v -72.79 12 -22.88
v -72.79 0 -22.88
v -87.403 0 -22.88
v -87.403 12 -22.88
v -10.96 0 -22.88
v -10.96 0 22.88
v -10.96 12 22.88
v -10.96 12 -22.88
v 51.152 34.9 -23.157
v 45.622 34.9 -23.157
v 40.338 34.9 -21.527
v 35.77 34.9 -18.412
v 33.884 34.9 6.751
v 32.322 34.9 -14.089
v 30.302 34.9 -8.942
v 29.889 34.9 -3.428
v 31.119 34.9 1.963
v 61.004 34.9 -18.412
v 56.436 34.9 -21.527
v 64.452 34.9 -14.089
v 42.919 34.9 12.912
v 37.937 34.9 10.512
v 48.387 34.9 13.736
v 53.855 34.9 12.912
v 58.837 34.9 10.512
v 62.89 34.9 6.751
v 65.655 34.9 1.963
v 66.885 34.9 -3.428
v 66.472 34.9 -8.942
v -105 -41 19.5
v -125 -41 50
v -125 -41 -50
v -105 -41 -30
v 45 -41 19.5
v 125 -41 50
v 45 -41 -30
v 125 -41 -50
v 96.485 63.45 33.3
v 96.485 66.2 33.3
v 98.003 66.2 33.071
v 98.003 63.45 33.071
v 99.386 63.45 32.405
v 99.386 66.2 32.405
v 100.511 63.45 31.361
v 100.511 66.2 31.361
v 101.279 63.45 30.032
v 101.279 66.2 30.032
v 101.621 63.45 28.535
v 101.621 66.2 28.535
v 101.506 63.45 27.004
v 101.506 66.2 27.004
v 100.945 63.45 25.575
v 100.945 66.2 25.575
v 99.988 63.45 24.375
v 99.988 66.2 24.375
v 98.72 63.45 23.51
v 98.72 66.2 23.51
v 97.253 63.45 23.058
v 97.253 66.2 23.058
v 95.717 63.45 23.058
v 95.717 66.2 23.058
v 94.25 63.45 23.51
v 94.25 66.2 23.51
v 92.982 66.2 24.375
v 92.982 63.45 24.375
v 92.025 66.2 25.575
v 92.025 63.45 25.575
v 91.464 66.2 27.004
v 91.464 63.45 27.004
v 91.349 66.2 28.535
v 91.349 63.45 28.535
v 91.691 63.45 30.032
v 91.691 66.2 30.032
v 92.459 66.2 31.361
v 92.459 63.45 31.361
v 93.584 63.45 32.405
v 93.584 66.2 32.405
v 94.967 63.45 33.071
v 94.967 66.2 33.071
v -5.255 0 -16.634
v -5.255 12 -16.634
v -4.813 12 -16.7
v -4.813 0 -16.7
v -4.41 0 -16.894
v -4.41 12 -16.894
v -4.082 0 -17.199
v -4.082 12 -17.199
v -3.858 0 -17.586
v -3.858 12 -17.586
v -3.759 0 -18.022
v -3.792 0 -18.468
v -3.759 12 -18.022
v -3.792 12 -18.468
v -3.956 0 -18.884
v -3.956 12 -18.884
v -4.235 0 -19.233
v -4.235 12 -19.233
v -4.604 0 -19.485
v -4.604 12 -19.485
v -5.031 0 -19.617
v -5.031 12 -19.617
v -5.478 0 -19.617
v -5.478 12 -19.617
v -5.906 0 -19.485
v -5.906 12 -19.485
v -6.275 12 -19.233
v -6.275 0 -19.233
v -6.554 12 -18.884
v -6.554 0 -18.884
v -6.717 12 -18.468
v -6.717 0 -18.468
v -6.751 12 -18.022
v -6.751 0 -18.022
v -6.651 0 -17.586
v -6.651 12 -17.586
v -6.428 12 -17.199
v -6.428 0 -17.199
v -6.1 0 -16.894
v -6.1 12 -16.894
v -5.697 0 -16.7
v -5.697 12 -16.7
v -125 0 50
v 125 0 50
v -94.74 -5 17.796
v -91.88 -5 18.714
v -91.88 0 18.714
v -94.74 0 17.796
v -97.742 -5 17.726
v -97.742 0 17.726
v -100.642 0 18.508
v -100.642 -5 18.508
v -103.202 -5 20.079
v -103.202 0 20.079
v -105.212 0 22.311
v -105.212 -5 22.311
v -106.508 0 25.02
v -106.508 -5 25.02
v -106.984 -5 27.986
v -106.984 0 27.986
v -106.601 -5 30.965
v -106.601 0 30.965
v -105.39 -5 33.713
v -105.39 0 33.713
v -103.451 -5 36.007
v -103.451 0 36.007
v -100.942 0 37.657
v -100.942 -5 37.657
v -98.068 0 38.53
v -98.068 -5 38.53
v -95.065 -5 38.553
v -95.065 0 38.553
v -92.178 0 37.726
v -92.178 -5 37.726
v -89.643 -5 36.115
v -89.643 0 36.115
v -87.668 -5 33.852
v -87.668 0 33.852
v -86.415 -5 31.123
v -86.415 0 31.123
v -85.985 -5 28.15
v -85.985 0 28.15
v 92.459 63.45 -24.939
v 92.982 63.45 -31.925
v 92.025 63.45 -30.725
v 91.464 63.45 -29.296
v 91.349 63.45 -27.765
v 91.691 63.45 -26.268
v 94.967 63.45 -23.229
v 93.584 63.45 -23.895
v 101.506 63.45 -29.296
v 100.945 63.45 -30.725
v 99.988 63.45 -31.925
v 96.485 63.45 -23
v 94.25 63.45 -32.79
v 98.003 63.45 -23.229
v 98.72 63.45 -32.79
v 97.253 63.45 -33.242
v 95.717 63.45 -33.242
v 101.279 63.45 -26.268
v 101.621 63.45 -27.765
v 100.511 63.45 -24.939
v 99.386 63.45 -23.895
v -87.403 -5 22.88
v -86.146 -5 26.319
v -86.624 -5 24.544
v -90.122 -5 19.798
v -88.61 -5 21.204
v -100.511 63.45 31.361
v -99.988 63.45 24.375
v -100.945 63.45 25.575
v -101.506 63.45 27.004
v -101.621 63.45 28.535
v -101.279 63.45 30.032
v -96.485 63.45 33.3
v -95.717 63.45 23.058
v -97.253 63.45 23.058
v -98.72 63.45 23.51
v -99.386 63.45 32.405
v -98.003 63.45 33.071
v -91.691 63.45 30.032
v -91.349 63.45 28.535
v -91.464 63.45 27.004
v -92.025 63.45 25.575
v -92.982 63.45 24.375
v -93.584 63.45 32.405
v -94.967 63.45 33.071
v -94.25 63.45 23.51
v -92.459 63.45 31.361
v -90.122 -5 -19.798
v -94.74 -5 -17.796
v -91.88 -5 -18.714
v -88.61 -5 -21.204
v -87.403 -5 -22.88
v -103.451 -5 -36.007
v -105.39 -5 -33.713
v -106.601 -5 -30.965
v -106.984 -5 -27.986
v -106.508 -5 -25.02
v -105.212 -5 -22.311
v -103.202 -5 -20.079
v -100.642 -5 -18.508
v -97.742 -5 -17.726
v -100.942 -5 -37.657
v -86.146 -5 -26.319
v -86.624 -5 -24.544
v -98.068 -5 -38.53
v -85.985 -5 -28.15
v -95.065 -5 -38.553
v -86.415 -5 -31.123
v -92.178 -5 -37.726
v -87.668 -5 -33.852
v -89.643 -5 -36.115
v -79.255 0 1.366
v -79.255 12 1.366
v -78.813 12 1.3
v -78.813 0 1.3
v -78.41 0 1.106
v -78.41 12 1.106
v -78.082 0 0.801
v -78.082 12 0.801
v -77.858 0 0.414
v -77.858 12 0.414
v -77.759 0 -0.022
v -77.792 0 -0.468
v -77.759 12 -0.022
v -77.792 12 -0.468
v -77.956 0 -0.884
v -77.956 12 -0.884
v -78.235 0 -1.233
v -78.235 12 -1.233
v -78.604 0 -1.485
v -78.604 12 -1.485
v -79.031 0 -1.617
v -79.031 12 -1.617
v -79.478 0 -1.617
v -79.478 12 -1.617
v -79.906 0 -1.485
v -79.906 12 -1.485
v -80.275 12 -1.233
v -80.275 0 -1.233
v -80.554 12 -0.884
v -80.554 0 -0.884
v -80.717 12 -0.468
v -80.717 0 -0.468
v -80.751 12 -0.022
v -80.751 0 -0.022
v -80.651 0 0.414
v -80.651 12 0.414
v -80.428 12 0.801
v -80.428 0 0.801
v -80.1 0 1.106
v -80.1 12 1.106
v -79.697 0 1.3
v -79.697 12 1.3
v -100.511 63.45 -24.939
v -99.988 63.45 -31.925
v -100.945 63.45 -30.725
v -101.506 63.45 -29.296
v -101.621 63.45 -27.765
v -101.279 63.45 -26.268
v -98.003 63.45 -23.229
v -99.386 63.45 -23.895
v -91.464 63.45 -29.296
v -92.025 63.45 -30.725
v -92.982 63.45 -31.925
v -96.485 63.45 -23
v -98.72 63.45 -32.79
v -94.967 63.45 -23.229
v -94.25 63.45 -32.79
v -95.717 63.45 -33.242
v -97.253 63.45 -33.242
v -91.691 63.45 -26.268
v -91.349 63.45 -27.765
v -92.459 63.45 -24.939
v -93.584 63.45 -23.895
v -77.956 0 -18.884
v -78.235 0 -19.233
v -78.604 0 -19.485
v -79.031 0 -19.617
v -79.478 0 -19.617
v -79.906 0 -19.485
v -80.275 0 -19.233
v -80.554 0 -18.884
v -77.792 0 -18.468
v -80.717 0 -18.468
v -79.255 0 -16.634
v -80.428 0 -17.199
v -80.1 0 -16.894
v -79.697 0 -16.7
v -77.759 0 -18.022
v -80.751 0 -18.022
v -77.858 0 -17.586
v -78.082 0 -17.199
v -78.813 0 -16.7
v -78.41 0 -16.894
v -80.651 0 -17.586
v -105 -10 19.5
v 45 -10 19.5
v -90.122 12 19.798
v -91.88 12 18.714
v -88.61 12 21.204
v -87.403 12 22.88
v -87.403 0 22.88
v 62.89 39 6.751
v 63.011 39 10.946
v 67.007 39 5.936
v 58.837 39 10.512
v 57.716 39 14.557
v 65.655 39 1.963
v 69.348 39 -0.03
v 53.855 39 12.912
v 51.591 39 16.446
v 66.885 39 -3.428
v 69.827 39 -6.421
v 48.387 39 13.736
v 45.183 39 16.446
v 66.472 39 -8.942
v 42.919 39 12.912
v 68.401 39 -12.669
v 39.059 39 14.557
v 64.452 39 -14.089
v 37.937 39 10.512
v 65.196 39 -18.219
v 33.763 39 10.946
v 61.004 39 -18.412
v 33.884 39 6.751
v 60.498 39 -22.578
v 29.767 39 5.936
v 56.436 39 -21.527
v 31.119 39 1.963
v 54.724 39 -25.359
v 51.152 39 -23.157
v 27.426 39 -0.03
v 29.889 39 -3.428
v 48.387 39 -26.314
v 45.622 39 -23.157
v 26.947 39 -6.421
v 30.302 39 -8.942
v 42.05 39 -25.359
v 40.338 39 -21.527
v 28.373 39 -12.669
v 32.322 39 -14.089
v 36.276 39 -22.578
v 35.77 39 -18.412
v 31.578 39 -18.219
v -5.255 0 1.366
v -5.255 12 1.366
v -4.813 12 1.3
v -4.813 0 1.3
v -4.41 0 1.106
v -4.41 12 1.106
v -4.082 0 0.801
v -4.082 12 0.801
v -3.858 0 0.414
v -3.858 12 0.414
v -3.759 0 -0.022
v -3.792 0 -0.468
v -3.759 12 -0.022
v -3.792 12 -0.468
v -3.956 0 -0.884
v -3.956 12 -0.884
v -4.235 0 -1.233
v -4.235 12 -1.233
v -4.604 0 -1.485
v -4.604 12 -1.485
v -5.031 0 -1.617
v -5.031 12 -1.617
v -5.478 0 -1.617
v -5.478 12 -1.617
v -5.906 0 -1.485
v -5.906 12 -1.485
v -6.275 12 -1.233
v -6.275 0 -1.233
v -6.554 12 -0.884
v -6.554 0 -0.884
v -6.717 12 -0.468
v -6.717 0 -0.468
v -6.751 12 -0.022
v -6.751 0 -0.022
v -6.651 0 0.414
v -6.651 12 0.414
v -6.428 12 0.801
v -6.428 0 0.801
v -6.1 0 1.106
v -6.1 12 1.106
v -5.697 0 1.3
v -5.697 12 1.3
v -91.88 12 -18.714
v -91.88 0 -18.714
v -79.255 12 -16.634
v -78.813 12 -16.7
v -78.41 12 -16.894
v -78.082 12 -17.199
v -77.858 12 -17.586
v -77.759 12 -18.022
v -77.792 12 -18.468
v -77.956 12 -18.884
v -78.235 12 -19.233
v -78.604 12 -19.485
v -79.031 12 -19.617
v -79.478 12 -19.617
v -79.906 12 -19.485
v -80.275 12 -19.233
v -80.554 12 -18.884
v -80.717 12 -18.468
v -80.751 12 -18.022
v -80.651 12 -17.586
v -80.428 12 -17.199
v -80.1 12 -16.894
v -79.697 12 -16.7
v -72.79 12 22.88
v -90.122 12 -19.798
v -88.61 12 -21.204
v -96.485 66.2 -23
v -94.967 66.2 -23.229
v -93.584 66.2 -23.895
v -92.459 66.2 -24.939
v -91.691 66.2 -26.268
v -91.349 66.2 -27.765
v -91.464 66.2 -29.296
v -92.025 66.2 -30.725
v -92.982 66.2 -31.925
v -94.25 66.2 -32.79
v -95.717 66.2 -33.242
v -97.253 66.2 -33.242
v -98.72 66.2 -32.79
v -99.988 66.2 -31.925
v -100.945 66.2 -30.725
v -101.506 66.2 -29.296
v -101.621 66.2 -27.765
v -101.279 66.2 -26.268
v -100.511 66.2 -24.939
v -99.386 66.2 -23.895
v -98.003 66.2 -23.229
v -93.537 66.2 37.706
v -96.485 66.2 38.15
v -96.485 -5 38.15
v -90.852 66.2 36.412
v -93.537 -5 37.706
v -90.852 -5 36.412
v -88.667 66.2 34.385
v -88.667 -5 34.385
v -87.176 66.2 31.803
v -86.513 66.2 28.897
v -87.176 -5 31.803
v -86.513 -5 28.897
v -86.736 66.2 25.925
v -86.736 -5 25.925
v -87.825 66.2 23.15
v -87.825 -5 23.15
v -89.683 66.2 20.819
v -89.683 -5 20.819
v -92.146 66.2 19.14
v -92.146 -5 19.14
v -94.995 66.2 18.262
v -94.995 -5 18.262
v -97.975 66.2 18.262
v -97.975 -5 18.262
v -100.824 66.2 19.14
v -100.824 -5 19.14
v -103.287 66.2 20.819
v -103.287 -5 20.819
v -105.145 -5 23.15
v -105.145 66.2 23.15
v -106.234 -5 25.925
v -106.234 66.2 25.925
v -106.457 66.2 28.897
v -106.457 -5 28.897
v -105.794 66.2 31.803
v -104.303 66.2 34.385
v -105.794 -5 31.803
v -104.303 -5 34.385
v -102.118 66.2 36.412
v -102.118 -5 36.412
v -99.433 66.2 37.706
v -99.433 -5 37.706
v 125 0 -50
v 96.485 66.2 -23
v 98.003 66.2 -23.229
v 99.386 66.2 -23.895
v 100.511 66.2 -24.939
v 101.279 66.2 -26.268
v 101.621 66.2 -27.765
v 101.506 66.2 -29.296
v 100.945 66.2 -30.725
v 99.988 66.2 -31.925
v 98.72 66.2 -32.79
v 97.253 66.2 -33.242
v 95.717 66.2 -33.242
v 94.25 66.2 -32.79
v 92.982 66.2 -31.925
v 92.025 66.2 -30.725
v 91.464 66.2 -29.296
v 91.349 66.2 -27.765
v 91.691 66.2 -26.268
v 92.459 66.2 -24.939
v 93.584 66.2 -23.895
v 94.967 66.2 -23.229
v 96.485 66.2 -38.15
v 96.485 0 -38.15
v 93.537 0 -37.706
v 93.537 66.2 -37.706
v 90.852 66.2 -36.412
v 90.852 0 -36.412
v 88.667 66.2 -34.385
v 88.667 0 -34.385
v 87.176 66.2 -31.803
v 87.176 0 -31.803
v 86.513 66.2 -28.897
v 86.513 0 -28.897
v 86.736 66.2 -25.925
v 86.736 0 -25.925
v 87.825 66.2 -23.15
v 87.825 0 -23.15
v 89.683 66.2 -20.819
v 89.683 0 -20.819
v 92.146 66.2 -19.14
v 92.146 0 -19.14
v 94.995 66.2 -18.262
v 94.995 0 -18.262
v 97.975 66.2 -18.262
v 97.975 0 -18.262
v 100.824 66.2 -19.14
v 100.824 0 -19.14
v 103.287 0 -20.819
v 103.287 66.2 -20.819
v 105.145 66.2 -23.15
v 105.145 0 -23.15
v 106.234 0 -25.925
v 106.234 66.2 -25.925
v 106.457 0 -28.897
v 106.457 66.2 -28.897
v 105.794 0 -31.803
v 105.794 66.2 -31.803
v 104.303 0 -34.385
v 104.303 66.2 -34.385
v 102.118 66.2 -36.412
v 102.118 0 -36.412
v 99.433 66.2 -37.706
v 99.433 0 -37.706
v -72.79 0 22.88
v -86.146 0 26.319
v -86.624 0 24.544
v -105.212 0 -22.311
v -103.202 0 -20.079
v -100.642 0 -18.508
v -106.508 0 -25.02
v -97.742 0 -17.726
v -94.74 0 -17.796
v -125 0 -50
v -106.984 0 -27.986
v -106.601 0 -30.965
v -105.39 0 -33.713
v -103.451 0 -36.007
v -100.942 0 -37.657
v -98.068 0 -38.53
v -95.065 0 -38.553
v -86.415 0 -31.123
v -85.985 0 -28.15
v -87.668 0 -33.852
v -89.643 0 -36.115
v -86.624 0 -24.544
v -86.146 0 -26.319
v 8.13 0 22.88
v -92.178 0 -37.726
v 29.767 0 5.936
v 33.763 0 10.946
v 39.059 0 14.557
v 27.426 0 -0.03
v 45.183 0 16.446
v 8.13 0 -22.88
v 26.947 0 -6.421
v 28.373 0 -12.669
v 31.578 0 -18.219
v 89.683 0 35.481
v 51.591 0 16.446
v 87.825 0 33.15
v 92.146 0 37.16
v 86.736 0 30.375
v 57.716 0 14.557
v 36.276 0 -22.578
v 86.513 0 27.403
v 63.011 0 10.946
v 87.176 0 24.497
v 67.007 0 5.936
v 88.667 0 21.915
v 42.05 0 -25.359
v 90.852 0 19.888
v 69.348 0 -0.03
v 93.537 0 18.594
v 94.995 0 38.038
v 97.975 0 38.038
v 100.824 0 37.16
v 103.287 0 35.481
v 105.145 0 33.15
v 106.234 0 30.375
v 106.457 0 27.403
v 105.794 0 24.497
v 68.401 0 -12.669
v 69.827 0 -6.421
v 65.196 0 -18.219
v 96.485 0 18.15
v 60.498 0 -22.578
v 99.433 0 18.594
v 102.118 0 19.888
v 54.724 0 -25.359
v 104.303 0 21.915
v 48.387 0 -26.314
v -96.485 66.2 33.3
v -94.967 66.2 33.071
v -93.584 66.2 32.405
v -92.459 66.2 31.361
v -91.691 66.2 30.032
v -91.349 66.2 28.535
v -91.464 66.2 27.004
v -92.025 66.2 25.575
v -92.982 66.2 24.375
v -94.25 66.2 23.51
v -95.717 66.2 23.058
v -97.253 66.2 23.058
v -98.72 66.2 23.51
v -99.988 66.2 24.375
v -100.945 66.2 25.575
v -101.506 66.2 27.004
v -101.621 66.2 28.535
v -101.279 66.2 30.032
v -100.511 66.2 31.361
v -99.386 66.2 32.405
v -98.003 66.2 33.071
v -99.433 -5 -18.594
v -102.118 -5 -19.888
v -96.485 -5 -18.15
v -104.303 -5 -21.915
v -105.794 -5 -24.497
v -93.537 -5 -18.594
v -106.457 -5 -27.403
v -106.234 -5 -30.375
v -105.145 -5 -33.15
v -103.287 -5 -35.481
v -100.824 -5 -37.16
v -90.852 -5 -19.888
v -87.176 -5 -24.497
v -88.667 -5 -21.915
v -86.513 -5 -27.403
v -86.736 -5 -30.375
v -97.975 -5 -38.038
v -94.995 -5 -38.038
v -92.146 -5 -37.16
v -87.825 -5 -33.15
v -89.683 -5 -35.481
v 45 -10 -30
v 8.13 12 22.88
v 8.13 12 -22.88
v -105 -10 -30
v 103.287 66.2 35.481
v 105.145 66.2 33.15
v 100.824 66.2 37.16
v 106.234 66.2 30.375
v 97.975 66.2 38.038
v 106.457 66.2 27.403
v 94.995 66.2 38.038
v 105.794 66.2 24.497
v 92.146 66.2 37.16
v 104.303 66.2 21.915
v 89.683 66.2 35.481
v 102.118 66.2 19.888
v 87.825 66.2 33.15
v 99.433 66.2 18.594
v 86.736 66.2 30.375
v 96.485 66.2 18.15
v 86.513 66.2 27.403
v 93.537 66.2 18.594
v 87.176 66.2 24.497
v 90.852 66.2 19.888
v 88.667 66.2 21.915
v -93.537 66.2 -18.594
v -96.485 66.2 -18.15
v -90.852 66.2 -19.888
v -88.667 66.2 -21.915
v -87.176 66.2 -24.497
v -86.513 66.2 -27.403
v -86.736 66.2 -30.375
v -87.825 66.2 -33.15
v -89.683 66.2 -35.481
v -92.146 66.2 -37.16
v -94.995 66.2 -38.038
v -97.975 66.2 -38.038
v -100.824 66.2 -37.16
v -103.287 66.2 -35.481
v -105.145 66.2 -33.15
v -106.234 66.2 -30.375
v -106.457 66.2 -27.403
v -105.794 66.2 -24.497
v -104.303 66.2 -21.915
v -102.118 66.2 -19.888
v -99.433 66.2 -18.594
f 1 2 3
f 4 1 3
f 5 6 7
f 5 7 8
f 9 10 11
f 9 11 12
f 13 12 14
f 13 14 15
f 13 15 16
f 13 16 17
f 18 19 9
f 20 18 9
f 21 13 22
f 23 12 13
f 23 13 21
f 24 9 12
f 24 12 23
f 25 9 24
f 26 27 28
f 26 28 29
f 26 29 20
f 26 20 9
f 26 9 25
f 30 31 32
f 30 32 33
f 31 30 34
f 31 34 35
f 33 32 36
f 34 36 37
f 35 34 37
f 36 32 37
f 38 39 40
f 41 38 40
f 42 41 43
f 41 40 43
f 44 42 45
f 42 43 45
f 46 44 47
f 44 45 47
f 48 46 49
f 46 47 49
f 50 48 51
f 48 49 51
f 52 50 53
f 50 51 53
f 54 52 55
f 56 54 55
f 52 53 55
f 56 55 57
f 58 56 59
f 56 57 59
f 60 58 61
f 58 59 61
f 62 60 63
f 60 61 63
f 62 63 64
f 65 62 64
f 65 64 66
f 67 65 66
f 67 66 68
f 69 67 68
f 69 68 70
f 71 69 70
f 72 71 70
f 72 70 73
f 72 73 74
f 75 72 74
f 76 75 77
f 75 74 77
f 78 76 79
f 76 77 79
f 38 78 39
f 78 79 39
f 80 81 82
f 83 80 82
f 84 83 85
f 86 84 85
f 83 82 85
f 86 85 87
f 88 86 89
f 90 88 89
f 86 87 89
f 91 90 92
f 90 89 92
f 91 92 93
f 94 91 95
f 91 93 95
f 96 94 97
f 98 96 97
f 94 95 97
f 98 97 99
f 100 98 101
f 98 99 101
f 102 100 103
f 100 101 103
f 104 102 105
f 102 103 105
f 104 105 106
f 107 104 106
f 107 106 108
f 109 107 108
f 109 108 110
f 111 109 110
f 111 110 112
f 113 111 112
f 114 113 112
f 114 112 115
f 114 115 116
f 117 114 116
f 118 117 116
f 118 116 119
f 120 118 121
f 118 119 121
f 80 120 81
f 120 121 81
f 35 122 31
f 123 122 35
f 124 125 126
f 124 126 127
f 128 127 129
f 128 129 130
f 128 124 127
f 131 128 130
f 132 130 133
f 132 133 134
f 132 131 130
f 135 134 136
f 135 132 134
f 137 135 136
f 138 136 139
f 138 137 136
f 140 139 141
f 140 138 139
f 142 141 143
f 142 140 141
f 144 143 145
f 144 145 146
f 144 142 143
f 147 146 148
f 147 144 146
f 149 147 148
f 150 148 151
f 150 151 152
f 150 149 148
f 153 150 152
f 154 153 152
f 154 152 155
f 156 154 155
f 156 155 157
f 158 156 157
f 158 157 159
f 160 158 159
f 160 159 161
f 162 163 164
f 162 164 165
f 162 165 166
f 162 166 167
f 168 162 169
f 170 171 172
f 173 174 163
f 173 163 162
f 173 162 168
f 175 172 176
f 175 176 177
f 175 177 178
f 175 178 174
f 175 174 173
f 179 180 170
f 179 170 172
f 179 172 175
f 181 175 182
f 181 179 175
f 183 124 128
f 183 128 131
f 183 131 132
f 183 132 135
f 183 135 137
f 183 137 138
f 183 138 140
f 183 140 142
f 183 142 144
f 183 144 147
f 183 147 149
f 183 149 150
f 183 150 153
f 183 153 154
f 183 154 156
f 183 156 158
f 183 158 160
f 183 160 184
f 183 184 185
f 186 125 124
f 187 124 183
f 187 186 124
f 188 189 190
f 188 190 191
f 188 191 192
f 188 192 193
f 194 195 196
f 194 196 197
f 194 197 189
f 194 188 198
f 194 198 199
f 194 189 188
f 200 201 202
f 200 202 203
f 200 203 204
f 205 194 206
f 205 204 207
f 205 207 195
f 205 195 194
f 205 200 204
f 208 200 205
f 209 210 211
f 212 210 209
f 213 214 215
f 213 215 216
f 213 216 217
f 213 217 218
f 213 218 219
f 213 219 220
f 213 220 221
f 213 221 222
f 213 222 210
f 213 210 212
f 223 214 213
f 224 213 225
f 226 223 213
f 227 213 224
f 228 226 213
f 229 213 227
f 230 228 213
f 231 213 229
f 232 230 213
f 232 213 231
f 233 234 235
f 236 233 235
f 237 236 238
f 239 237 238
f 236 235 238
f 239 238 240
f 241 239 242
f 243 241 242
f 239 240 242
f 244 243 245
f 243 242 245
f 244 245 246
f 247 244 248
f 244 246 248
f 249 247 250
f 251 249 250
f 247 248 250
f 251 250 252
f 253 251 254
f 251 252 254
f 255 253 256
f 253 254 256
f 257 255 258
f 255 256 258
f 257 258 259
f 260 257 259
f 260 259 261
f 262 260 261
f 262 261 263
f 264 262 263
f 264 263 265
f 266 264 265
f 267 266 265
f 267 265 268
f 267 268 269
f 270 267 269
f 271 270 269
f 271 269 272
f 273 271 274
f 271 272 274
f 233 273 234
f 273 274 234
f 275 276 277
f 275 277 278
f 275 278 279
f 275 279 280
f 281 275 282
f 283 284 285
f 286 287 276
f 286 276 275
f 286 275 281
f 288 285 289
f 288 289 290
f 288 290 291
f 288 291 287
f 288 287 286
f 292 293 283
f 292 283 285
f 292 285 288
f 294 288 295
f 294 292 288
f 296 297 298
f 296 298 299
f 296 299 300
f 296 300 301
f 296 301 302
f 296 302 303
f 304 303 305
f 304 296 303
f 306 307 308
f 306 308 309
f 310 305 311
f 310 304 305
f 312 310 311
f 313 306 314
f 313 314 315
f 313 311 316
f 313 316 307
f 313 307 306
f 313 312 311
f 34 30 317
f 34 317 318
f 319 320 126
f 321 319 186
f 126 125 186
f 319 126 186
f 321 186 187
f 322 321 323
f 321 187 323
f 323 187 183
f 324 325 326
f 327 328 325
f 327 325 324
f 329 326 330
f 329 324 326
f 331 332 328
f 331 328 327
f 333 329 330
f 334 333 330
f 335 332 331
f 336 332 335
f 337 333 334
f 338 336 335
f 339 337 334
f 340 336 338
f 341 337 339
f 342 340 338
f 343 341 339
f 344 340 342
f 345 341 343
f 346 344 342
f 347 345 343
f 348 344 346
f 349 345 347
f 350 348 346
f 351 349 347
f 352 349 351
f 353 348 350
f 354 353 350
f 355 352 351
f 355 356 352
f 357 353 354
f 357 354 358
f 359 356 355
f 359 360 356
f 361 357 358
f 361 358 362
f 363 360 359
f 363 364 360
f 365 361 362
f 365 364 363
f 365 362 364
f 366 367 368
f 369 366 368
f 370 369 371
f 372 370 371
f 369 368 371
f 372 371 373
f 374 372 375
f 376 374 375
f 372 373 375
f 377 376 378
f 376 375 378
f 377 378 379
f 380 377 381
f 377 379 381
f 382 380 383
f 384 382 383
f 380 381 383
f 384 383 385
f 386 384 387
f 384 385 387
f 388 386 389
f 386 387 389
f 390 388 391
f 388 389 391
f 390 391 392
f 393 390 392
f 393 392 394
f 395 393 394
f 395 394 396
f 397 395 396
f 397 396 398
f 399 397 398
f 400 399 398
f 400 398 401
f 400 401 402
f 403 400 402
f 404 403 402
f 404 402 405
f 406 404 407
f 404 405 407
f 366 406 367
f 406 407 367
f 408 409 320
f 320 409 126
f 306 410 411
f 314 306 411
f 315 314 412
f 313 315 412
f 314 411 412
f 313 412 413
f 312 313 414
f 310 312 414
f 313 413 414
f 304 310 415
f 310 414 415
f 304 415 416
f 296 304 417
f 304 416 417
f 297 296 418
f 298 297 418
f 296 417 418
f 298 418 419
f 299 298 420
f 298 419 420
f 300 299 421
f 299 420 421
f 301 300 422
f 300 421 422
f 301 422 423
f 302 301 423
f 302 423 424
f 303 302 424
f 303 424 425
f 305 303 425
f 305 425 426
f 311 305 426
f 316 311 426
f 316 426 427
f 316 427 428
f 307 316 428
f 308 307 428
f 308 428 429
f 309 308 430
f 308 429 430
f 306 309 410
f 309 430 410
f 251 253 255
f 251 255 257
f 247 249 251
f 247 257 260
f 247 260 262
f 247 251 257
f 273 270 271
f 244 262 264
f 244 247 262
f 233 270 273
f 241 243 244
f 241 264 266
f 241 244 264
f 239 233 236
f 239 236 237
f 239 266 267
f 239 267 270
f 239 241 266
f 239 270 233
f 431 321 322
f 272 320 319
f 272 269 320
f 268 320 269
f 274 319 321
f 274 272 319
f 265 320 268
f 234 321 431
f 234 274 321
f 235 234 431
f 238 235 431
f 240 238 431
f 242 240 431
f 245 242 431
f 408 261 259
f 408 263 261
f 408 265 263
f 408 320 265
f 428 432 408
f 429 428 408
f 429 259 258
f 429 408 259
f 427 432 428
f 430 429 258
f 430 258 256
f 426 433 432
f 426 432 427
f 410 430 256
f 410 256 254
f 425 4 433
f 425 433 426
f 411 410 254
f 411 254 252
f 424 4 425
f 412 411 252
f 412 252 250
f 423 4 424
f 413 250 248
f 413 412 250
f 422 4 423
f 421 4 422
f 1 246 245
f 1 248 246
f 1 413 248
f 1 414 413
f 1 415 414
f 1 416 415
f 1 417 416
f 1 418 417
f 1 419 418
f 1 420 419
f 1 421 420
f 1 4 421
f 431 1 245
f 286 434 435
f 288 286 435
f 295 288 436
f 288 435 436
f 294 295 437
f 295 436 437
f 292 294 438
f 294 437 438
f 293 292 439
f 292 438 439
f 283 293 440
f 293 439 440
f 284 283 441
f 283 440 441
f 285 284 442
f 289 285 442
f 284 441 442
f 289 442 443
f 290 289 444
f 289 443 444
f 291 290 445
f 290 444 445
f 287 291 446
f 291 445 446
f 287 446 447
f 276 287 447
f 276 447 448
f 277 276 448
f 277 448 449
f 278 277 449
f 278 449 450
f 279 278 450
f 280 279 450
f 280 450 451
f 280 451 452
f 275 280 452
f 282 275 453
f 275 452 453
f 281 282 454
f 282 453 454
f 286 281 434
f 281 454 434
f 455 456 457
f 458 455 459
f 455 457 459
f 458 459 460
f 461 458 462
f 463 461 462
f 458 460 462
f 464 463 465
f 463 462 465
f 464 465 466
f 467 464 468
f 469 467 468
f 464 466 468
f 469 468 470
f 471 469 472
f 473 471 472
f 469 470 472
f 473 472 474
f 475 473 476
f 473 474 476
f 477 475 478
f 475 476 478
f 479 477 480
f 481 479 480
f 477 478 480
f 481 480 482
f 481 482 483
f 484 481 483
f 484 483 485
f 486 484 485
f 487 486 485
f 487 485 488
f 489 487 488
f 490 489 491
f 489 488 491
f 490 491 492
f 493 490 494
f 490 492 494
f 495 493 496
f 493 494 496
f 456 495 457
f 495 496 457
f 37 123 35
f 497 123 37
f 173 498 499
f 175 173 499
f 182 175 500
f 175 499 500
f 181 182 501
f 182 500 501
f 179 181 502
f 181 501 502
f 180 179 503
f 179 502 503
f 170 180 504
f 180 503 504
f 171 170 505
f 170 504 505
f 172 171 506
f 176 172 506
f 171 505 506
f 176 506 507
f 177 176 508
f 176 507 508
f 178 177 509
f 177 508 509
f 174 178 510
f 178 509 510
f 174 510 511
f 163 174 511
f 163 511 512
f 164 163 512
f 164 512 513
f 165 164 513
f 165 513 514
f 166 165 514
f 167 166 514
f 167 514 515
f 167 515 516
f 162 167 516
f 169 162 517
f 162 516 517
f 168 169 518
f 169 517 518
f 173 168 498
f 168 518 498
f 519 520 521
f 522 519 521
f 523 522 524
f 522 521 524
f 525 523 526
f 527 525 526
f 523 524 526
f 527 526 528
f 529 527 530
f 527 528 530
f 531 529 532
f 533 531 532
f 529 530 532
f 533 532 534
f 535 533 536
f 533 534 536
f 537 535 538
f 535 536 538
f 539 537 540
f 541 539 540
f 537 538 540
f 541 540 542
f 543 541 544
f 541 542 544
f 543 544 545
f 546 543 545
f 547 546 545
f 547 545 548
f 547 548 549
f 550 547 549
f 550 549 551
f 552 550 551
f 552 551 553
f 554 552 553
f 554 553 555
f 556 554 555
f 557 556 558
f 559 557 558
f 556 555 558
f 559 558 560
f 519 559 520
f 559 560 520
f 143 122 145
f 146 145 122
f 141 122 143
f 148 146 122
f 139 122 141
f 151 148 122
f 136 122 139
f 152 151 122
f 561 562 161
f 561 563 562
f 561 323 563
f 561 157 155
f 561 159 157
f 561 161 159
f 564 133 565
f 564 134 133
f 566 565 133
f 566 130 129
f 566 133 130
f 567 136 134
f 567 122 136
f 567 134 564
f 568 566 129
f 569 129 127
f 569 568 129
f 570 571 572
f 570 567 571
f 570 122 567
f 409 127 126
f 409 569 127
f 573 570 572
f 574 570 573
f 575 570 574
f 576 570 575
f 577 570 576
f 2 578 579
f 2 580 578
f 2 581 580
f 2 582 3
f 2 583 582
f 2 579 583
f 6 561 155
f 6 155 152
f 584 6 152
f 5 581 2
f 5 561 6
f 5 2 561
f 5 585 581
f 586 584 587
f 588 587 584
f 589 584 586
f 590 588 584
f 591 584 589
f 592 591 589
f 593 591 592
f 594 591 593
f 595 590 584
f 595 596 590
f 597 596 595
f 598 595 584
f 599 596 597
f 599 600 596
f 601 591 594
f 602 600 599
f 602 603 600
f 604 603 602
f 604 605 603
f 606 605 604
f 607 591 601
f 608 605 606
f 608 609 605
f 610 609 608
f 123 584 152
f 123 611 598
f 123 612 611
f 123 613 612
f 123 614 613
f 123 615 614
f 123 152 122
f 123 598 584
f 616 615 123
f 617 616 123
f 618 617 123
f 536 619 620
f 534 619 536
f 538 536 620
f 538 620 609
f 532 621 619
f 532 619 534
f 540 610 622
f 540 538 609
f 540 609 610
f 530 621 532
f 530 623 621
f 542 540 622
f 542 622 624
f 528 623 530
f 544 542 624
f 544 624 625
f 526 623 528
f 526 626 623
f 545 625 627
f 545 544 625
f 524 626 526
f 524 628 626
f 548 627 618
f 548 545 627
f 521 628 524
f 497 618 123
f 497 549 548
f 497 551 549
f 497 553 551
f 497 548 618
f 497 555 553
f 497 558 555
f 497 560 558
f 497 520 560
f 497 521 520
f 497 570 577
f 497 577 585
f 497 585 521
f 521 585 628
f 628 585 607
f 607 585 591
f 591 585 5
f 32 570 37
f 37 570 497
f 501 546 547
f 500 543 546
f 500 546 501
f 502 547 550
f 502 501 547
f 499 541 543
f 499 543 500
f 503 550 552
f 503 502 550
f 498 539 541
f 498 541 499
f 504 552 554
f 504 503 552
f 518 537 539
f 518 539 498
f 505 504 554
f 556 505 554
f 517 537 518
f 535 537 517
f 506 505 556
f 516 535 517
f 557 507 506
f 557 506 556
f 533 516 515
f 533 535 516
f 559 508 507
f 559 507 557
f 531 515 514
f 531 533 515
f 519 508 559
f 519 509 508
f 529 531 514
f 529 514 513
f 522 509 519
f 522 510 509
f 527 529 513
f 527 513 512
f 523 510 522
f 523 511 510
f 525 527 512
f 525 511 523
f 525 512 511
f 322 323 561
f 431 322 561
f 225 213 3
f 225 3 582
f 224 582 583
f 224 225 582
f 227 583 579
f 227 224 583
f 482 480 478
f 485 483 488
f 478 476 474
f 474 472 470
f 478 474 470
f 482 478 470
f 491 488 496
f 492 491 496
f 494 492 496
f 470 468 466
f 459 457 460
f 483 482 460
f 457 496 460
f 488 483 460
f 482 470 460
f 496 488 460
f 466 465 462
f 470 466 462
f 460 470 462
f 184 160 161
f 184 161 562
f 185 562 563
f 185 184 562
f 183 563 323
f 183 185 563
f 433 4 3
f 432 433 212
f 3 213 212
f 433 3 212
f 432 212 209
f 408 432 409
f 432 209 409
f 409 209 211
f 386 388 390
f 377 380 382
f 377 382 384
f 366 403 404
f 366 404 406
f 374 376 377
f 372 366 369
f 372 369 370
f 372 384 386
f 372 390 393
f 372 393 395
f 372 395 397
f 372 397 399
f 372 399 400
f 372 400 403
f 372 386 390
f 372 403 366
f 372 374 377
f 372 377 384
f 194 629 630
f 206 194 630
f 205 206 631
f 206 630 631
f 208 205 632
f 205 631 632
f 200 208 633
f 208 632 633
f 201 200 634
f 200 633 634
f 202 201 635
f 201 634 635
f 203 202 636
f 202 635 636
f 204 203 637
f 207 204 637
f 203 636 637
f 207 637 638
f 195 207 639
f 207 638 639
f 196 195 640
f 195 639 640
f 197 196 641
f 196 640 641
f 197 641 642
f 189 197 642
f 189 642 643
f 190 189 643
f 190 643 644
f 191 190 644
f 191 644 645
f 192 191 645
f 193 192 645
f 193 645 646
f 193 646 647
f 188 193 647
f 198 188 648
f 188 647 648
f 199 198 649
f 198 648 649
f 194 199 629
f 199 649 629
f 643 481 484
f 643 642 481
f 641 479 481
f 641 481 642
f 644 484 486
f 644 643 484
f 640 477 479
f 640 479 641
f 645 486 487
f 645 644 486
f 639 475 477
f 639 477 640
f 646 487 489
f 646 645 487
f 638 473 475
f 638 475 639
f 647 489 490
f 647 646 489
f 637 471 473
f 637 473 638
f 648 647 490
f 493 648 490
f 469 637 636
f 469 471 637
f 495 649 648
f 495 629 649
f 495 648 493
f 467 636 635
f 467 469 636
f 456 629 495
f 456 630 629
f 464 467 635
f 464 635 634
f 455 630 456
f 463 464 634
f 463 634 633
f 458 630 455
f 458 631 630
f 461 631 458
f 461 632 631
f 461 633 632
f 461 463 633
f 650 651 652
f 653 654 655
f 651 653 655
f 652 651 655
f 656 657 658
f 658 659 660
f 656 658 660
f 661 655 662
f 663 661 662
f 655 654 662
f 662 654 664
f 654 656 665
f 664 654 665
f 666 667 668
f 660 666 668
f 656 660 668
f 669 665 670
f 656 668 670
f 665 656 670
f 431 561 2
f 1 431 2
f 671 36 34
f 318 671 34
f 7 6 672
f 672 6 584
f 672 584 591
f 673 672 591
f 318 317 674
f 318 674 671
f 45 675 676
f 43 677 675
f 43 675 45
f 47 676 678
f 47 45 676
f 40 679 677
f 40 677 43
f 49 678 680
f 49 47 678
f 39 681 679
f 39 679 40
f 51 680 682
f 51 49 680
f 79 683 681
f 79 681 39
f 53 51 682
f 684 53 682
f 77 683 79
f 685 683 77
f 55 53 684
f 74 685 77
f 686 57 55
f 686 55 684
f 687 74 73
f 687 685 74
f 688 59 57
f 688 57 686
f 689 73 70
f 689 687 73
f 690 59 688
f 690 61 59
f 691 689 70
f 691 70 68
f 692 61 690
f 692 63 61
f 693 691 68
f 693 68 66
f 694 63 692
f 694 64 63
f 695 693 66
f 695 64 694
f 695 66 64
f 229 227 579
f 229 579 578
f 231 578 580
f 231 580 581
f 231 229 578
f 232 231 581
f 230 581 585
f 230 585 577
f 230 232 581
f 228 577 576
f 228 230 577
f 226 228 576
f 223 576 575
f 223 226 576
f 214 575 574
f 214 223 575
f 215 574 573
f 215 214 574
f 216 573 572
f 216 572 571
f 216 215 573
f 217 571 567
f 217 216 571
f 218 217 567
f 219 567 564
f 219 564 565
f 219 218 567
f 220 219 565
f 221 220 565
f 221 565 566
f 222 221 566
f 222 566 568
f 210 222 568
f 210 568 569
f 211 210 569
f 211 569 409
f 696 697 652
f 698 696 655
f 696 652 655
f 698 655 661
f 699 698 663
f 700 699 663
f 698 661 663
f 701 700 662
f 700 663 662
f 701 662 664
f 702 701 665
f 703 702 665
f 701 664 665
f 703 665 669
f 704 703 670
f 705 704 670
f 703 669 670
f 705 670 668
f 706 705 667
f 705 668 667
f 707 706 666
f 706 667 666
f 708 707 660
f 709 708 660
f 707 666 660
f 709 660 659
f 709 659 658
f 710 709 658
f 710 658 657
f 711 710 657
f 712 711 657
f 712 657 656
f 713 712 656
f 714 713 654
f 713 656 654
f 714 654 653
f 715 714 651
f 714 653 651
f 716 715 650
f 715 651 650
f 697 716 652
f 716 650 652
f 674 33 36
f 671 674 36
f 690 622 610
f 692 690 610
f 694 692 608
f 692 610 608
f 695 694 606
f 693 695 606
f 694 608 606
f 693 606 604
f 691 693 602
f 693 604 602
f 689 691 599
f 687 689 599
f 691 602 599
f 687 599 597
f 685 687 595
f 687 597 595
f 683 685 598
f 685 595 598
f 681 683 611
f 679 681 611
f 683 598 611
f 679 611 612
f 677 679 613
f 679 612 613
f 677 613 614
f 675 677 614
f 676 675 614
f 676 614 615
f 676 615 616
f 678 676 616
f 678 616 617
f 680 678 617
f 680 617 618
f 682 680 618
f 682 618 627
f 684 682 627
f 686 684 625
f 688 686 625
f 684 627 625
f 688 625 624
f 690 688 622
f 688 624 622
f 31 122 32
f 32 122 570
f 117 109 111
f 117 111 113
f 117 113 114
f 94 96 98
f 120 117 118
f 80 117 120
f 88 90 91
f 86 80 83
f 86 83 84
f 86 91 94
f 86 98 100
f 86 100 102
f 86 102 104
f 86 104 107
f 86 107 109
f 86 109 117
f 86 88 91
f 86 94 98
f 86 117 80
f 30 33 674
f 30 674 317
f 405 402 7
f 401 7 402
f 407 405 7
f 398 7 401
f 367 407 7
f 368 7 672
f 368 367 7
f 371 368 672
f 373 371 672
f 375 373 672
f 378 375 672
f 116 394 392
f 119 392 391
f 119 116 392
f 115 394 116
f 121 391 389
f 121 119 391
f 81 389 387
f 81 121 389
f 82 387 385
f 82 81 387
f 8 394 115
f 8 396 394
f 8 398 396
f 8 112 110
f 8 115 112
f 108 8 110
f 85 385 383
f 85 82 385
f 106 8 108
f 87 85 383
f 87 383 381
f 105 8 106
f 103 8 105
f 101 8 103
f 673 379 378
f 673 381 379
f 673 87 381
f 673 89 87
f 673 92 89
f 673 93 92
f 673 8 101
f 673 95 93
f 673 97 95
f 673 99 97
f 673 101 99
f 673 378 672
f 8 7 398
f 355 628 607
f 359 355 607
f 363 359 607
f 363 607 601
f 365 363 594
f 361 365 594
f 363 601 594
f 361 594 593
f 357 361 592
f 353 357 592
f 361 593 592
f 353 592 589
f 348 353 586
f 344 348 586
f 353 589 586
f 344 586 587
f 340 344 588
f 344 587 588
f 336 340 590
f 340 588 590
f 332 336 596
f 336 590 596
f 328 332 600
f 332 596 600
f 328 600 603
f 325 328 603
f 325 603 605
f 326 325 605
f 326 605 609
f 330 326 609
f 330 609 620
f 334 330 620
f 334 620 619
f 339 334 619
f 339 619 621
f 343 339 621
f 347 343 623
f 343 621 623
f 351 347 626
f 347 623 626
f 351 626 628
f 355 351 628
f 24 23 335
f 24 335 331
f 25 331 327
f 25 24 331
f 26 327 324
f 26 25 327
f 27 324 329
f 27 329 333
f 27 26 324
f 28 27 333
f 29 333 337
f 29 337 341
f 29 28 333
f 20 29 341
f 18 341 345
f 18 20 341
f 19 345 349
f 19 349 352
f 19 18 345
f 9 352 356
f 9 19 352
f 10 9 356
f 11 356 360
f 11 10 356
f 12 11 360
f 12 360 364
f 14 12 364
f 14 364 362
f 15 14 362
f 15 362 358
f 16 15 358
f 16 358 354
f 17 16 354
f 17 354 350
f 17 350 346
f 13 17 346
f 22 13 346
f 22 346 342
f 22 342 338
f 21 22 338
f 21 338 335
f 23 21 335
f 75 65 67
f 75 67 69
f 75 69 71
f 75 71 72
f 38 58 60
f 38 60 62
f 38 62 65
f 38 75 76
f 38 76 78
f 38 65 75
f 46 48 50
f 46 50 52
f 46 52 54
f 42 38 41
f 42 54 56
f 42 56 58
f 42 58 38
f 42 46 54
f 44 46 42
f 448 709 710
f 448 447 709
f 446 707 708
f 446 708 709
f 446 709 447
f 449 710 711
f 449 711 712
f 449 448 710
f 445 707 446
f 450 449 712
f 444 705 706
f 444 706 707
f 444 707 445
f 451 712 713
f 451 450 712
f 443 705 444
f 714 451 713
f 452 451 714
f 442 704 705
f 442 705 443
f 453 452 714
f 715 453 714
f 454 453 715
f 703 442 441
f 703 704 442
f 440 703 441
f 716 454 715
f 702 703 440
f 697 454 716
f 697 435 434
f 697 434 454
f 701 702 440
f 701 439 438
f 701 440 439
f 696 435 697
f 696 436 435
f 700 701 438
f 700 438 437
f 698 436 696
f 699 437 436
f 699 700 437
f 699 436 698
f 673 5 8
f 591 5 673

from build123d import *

# Parameters (mm, degrees)
SKETCH1_W                = 250
SKETCH1_H                = 100
BOSS_EXTRUDE1_DEPTH      = 41
SKETCH1_4_W              = 19.09
SKETCH1_4_H              = 45.76
BOSS_EXTRUDE2_DEPTH      = 12
SKETCH1_5_R              = 21.5
SKETCH1_5_R_2            = 18.55
BOSS_EXTRUDE3_DEPTH      = 39
SKETCH1_6_R              = 18.55
BOSS_EXTRUDE4_DEPTH      = 34.9
CUT_EXTRUDE1_START       = -5
SKETCH1_9_R              = 10
SKETCH1_9_R_2            = 5.15
CUT_EXTRUDE1_DEPTH       = 5
SKETCH1_10_R             = 10
SKETCH1_10_R_2           = 5.15
BOSS_EXTRUDE7_DEPTH      = 66.2
BOSS_EXTRUDE8_DEPTH      = 66.2
BOSS_EXTRUDE8_DEPTH_BACK = 5
SKETCH1_11_R             = 10
SKETCH1_11_R_2           = 5.15
CUT_EXTRUDE2_START       = 66.2
SKETCH1_12_R             = 5.15
CUT_EXTRUDE2_DEPTH       = 2.75
SKETCH3_R                = 1.5
CUT_EXTRUDE3_DEPTH       = 12
SKETCH4_W                = 150
SKETCH4_H                = 49.5
CUT_EXTRUDE4_DEPTH       = 31


with BuildPart() as part:
    # Sketch1 → Boss-Extrude1 (new body)
    with BuildSketch(Plane(origin=(0, 0, 0), x_dir=(1, 0, 0), z_dir=(0, 1, 0))):
        Rectangle(SKETCH1_W, SKETCH1_H)
    extrude(amount=-BOSS_EXTRUDE1_DEPTH)

    # Sketch1<4> → Boss-Extrude2 (add)
    with BuildSketch(Plane(origin=(0, 0, 0), x_dir=(1, 0, 0), z_dir=(0, 1, 0))):
        with BuildLine():
            Line((-72.79, 22.88), (-87.40331, 22.88))
            ThreePointArc((-87.40331, 22.88), (-89.331615, 20.463708), (-91.88, 18.713688))
            Line((-91.88, 18.713688), (-91.88, -18.713688))
            ThreePointArc((-91.88, -18.713688), (-89.331615, -20.463708), (-87.40331, -22.88))
            Line((-87.40331, -22.88), (-72.79, -22.88))
            Line((-72.79, -22.88), (-72.79, 22.88))
        make_face()
        with Locations((-1.415, 0)):
            Rectangle(SKETCH1_4_W, SKETCH1_4_H)
    extrude(amount=BOSS_EXTRUDE2_DEPTH)

    # Sketch1<5> → Boss-Extrude3 (add)
    with BuildSketch(Plane(origin=(0, 0, 0), x_dir=(1, 0, 0), z_dir=(0, 1, 0))):
        with Locations(Location((48.387034, 4.81425, 0), (0, 0, 90))):
            Circle(SKETCH1_5_R)
        with Locations(Location((48.387034, 4.81425, 0), (0, 0, 270))):
            Circle(SKETCH1_5_R_2, mode=Mode.SUBTRACT)
    extrude(amount=BOSS_EXTRUDE3_DEPTH)

    # Sketch1<6> → Boss-Extrude4 (add)
    with BuildSketch(Plane(origin=(0, 0, 0), x_dir=(1, 0, 0), z_dir=(0, 1, 0))):
        with Locations(Location((48.387034, 4.81425, 0), (0, 0, 270))):
            Circle(SKETCH1_6_R)
    extrude(amount=BOSS_EXTRUDE4_DEPTH)

    # Sketch1<9> → Cut-Extrude1 (cut)
    # profile 1 of 12: a face of its own
    with BuildSketch(Plane(origin=(0, 0, 0), x_dir=(1, 0, 0), z_dir=(0, 1, 0)).offset(CUT_EXTRUDE1_START)):
        with BuildLine():
            ThreePointArc((-87.40331, -22.88), (-89.331615, -20.463708), (-91.88, -18.713688))
            Line((-91.88, -18.713688), (-91.88, -19.273403))
            ThreePointArc((-91.88, -19.273403), (-89.689537, -20.813674), (-87.986347, -22.88))
            Line((-87.986347, -22.88), (-87.40331, -22.88))
        make_face()
    # profile 2 of 12: a face of its own
    with BuildSketch(Plane(origin=(0, 0, 0), x_dir=(1, 0, 0), z_dir=(0, 1, 0)).offset(CUT_EXTRUDE1_START)):
        with BuildLine():
            Line((-91.88, -19.273403), (-91.88, -18.713688))
            ThreePointArc((-91.88, -18.713688), (-105.390125, -33.71316), (-85.985, -28.15))
            ThreePointArc((-85.985, -28.15), (-86.345775, -25.421241), (-87.40331, -22.88))
            Line((-87.40331, -22.88), (-87.986347, -22.88))
            ThreePointArc((-87.986347, -22.88), (-86.867658, -25.410158), (-86.485, -28.15))
            ThreePointArc((-86.485, -28.15), (-105.030467, -33.343746), (-91.88, -19.273403))
        make_face()
    # profile 3 of 12: a face of its own
    with BuildSketch(Plane(origin=(0, 0, 0), x_dir=(1, 0, 0), z_dir=(0, 1, 0)).offset(CUT_EXTRUDE1_START)):
        with Locations((-96.485, -28.15)):
            Circle(SKETCH1_9_R)
        with Locations((-96.485, -28.15)):
            Circle(SKETCH1_9_R_2, mode=Mode.SUBTRACT)
    # profile 4 of 12: a face of its own
    with BuildSketch(Plane(origin=(0, 0, 0), x_dir=(1, 0, 0), z_dir=(0, 1, 0)).offset(CUT_EXTRUDE1_START)):
        with Locations((-96.485, -28.15)):
            Circle(SKETCH1_9_R_2)
    # profile 5 of 12: a face of its own
    with BuildSketch(Plane(origin=(0, 0, 0), x_dir=(1, 0, 0), z_dir=(0, 1, 0)).offset(CUT_EXTRUDE1_START)):
        with BuildLine():
            ThreePointArc((-86.485, 28.15), (-86.867658, 25.410158), (-87.986347, 22.88))
            Line((-87.986347, 22.88), (-87.40331, 22.88))
            ThreePointArc((-87.40331, 22.88), (-86.345775, 25.421241), (-85.985, 28.15))
            ThreePointArc((-85.985, 28.15), (-105.390125, 33.71316), (-91.88, 18.713688))
            Line((-91.88, 18.713688), (-91.88, 19.273403))
            ThreePointArc((-91.88, 19.273403), (-105.030467, 33.343746), (-86.485, 28.15))
        make_face()
    # profile 6 of 12: a face of its own
    with BuildSketch(Plane(origin=(0, 0, 0), x_dir=(1, 0, 0), z_dir=(0, 1, 0)).offset(CUT_EXTRUDE1_START)):
        with BuildLine():
            Line((-87.40331, 22.88), (-87.986347, 22.88))
            ThreePointArc((-87.986347, 22.88), (-89.689537, 20.813674), (-91.88, 19.273403))
            Line((-91.88, 19.273403), (-91.88, 18.713688))
            ThreePointArc((-91.88, 18.713688), (-89.331615, 20.463708), (-87.40331, 22.88))
        make_face()
    # profile 7 of 12: a face of its own
    with BuildSketch(Plane(origin=(0, 0, 0), x_dir=(1, 0, 0), z_dir=(0, 1, 0)).offset(CUT_EXTRUDE1_START)):
        with Locations((-96.485, 28.15)):
            Circle(SKETCH1_9_R)
        with Locations((-96.485, 28.15)):
            Circle(SKETCH1_9_R_2, mode=Mode.SUBTRACT)
    # profile 8 of 12: a face of its own
    with BuildSketch(Plane(origin=(0, 0, 0), x_dir=(1, 0, 0), z_dir=(0, 1, 0)).offset(CUT_EXTRUDE1_START)):
        with Locations((-96.485, 28.15)):
            Circle(SKETCH1_9_R_2)
    # profile 9 of 12: a face of its own
    with BuildSketch(Plane(origin=(0, 0, 0), x_dir=(1, 0, 0), z_dir=(0, 1, 0)).offset(CUT_EXTRUDE1_START)):
        with BuildLine():
            ThreePointArc((-87.40331, -22.88), (-89.331615, -20.463708), (-91.88, -18.713688))
            Line((-91.88, -18.713688), (-91.88, -19.273403))
            ThreePointArc((-91.88, -19.273403), (-89.689537, -20.813674), (-87.986347, -22.88))
            Line((-87.986347, -22.88), (-87.40331, -22.88))
        make_face()
    # profile 10 of 12: a face of its own
    with BuildSketch(Plane(origin=(0, 0, 0), x_dir=(1, 0, 0), z_dir=(0, 1, 0)).offset(CUT_EXTRUDE1_START)):
        with BuildLine():
            Line((-91.88, -19.273403), (-91.88, -18.713688))
            ThreePointArc((-91.88, -18.713688), (-105.390125, -33.71316), (-85.985, -28.15))
            ThreePointArc((-85.985, -28.15), (-86.345775, -25.421241), (-87.40331, -22.88))
            Line((-87.40331, -22.88), (-87.986347, -22.88))
            ThreePointArc((-87.986347, -22.88), (-86.867658, -25.410158), (-86.485, -28.15))
            ThreePointArc((-86.485, -28.15), (-105.030467, -33.343746), (-91.88, -19.273403))
        make_face()
    # profile 11 of 12: a face of its own
    with BuildSketch(Plane(origin=(0, 0, 0), x_dir=(1, 0, 0), z_dir=(0, 1, 0)).offset(CUT_EXTRUDE1_START)):
        with BuildLine():
            ThreePointArc((-86.485, 28.15), (-86.867658, 25.410158), (-87.986347, 22.88))
            Line((-87.986347, 22.88), (-87.40331, 22.88))
            ThreePointArc((-87.40331, 22.88), (-86.345775, 25.421241), (-85.985, 28.15))
            ThreePointArc((-85.985, 28.15), (-105.390125, 33.71316), (-91.88, 18.713688))
            Line((-91.88, 18.713688), (-91.88, 19.273403))
            ThreePointArc((-91.88, 19.273403), (-105.030467, 33.343746), (-86.485, 28.15))
        make_face()
    # profile 12 of 12: a face of its own
    with BuildSketch(Plane(origin=(0, 0, 0), x_dir=(1, 0, 0), z_dir=(0, 1, 0)).offset(CUT_EXTRUDE1_START)):
        with BuildLine():
            Line((-87.40331, 22.88), (-87.986347, 22.88))
            ThreePointArc((-87.986347, 22.88), (-89.689537, 20.813674), (-91.88, 19.273403))
            Line((-91.88, 19.273403), (-91.88, 18.713688))
            ThreePointArc((-91.88, 18.713688), (-89.331615, 20.463708), (-87.40331, 22.88))
        make_face()
    extrude(amount=CUT_EXTRUDE1_DEPTH, mode=Mode.SUBTRACT)

    # Sketch1<10> → Boss-Extrude7 (add)
    # profile 1 of 4: a face of its own
    with BuildSketch(Plane(origin=(0, 0, 0), x_dir=(1, 0, 0), z_dir=(0, 1, 0))):
        with Locations(Location((96.485, -28.15, 0), (0, 0, 90))):
            Circle(SKETCH1_10_R)
        with Locations((96.485, -28.15)):
            Circle(SKETCH1_10_R_2, mode=Mode.SUBTRACT)
    # profile 2 of 4: a face of its own
    with BuildSketch(Plane(origin=(0, 0, 0), x_dir=(1, 0, 0), z_dir=(0, 1, 0))):
        with Locations((96.485, -28.15)):
            Circle(SKETCH1_10_R_2)
    # profile 3 of 4: a face of its own
    with BuildSketch(Plane(origin=(0, 0, 0), x_dir=(1, 0, 0), z_dir=(0, 1, 0))):
        with Locations(Location((96.485, 28.15, 0), (0, 0, 90))):
            Circle(SKETCH1_10_R)
        with Locations((96.485, 28.15)):
            Circle(SKETCH1_10_R_2, mode=Mode.SUBTRACT)
    # profile 4 of 4: a face of its own
    with BuildSketch(Plane(origin=(0, 0, 0), x_dir=(1, 0, 0), z_dir=(0, 1, 0))):
        with Locations((96.485, 28.15)):
            Circle(SKETCH1_10_R_2)
    extrude(amount=BOSS_EXTRUDE7_DEPTH)


with BuildPart() as body_2:
    # Sketch1<11> → Boss-Extrude8 (new, two sides: drawn at the far end of the back side and taken through both)
    # profile 1 of 4: a face of its own
    with BuildSketch(Plane(origin=(0, 0, 0), x_dir=(1, 0, 0), z_dir=(0, 1, 0)).offset(-BOSS_EXTRUDE8_DEPTH_BACK)):
        with Locations(Location((-96.485, -28.15, 0), (0, 0, 270))):
            Circle(SKETCH1_11_R)
        with Locations((-96.485, -28.15)):
            Circle(SKETCH1_11_R_2, mode=Mode.SUBTRACT)
    # profile 2 of 4: a face of its own
    with BuildSketch(Plane(origin=(0, 0, 0), x_dir=(1, 0, 0), z_dir=(0, 1, 0)).offset(-BOSS_EXTRUDE8_DEPTH_BACK)):
        with Locations((-96.485, -28.15)):
            Circle(SKETCH1_11_R_2)
    # profile 3 of 4: a face of its own
    with BuildSketch(Plane(origin=(0, 0, 0), x_dir=(1, 0, 0), z_dir=(0, 1, 0)).offset(-BOSS_EXTRUDE8_DEPTH_BACK)):
        with Locations(Location((-96.485, 28.15, 0), (0, 0, 270))):
            Circle(SKETCH1_11_R)
        with Locations((-96.485, 28.15)):
            Circle(SKETCH1_11_R_2, mode=Mode.SUBTRACT)
    # profile 4 of 4: a face of its own
    with BuildSketch(Plane(origin=(0, 0, 0), x_dir=(1, 0, 0), z_dir=(0, 1, 0)).offset(-BOSS_EXTRUDE8_DEPTH_BACK)):
        with Locations((-96.485, 28.15)):
            Circle(SKETCH1_11_R_2)
    extrude(amount=BOSS_EXTRUDE8_DEPTH + BOSS_EXTRUDE8_DEPTH_BACK)


with BuildPart() as cut_extrude2_tool:
    # Sketch1<12> → Cut-Extrude2 (new body)
    with BuildSketch(Plane(origin=(0, 0, 0), x_dir=(1, 0, 0), z_dir=(0, 1, 0)).offset(CUT_EXTRUDE2_START)):
        with Locations(Location((-96.485, 28.15, 0), (0, 0, 270))):
            Circle(SKETCH1_12_R)
        with Locations(Location((-96.485, -28.15, 0), (0, 0, 270))):
            Circle(SKETCH1_12_R)
        with Locations(Location((96.485, 28.15, 0), (0, 0, 270))):
            Circle(SKETCH1_12_R)
        with Locations(Location((96.485, -28.15, 0), (0, 0, 270))):
            Circle(SKETCH1_12_R)
    extrude(amount=-CUT_EXTRUDE2_DEPTH)


with BuildPart() as part_1:
    add(part.part)

    # Cut-Extrude2: cut by cut_extrude2_tool
    add(cut_extrude2_tool.part, mode=Mode.SUBTRACT)

    # Sketch3 → Cut-Extrude3 (cut)
    with BuildSketch(Plane(origin=(0, 12, 0), x_dir=(1, 0, 0), z_dir=(0, 1, 0))):
        with Locations(Location((-79.254798, 18.133761, 0), (0, 0, 270))):
            Circle(SKETCH3_R)
        with Locations(Location((-79.254798, 0.133761, 0), (0, 0, 270))):
            Circle(SKETCH3_R)
        with Locations(Location((-5.254798, 18.133761, 0), (0, 0, 270))):
            Circle(SKETCH3_R)
        with Locations(Location((-5.254798, 0.133761, 0), (0, 0, 270))):
            Circle(SKETCH3_R)
    extrude(amount=-CUT_EXTRUDE3_DEPTH, mode=Mode.SUBTRACT)

    # Sketch4 → Cut-Extrude4 (cut)
    with BuildSketch(Plane.XZ.offset(41)):
        with Locations((-30, -5.25)):
            Rectangle(SKETCH4_W, SKETCH4_H)
    extrude(amount=-CUT_EXTRUDE4_DEPTH, mode=Mode.SUBTRACT)


with BuildPart() as body_2_1:
    add(body_2.part)

    # Cut-Extrude2: cut by cut_extrude2_tool
    add(cut_extrude2_tool.part, mode=Mode.SUBTRACT)


solid = Compound([part_1.part, body_2_1.part])
